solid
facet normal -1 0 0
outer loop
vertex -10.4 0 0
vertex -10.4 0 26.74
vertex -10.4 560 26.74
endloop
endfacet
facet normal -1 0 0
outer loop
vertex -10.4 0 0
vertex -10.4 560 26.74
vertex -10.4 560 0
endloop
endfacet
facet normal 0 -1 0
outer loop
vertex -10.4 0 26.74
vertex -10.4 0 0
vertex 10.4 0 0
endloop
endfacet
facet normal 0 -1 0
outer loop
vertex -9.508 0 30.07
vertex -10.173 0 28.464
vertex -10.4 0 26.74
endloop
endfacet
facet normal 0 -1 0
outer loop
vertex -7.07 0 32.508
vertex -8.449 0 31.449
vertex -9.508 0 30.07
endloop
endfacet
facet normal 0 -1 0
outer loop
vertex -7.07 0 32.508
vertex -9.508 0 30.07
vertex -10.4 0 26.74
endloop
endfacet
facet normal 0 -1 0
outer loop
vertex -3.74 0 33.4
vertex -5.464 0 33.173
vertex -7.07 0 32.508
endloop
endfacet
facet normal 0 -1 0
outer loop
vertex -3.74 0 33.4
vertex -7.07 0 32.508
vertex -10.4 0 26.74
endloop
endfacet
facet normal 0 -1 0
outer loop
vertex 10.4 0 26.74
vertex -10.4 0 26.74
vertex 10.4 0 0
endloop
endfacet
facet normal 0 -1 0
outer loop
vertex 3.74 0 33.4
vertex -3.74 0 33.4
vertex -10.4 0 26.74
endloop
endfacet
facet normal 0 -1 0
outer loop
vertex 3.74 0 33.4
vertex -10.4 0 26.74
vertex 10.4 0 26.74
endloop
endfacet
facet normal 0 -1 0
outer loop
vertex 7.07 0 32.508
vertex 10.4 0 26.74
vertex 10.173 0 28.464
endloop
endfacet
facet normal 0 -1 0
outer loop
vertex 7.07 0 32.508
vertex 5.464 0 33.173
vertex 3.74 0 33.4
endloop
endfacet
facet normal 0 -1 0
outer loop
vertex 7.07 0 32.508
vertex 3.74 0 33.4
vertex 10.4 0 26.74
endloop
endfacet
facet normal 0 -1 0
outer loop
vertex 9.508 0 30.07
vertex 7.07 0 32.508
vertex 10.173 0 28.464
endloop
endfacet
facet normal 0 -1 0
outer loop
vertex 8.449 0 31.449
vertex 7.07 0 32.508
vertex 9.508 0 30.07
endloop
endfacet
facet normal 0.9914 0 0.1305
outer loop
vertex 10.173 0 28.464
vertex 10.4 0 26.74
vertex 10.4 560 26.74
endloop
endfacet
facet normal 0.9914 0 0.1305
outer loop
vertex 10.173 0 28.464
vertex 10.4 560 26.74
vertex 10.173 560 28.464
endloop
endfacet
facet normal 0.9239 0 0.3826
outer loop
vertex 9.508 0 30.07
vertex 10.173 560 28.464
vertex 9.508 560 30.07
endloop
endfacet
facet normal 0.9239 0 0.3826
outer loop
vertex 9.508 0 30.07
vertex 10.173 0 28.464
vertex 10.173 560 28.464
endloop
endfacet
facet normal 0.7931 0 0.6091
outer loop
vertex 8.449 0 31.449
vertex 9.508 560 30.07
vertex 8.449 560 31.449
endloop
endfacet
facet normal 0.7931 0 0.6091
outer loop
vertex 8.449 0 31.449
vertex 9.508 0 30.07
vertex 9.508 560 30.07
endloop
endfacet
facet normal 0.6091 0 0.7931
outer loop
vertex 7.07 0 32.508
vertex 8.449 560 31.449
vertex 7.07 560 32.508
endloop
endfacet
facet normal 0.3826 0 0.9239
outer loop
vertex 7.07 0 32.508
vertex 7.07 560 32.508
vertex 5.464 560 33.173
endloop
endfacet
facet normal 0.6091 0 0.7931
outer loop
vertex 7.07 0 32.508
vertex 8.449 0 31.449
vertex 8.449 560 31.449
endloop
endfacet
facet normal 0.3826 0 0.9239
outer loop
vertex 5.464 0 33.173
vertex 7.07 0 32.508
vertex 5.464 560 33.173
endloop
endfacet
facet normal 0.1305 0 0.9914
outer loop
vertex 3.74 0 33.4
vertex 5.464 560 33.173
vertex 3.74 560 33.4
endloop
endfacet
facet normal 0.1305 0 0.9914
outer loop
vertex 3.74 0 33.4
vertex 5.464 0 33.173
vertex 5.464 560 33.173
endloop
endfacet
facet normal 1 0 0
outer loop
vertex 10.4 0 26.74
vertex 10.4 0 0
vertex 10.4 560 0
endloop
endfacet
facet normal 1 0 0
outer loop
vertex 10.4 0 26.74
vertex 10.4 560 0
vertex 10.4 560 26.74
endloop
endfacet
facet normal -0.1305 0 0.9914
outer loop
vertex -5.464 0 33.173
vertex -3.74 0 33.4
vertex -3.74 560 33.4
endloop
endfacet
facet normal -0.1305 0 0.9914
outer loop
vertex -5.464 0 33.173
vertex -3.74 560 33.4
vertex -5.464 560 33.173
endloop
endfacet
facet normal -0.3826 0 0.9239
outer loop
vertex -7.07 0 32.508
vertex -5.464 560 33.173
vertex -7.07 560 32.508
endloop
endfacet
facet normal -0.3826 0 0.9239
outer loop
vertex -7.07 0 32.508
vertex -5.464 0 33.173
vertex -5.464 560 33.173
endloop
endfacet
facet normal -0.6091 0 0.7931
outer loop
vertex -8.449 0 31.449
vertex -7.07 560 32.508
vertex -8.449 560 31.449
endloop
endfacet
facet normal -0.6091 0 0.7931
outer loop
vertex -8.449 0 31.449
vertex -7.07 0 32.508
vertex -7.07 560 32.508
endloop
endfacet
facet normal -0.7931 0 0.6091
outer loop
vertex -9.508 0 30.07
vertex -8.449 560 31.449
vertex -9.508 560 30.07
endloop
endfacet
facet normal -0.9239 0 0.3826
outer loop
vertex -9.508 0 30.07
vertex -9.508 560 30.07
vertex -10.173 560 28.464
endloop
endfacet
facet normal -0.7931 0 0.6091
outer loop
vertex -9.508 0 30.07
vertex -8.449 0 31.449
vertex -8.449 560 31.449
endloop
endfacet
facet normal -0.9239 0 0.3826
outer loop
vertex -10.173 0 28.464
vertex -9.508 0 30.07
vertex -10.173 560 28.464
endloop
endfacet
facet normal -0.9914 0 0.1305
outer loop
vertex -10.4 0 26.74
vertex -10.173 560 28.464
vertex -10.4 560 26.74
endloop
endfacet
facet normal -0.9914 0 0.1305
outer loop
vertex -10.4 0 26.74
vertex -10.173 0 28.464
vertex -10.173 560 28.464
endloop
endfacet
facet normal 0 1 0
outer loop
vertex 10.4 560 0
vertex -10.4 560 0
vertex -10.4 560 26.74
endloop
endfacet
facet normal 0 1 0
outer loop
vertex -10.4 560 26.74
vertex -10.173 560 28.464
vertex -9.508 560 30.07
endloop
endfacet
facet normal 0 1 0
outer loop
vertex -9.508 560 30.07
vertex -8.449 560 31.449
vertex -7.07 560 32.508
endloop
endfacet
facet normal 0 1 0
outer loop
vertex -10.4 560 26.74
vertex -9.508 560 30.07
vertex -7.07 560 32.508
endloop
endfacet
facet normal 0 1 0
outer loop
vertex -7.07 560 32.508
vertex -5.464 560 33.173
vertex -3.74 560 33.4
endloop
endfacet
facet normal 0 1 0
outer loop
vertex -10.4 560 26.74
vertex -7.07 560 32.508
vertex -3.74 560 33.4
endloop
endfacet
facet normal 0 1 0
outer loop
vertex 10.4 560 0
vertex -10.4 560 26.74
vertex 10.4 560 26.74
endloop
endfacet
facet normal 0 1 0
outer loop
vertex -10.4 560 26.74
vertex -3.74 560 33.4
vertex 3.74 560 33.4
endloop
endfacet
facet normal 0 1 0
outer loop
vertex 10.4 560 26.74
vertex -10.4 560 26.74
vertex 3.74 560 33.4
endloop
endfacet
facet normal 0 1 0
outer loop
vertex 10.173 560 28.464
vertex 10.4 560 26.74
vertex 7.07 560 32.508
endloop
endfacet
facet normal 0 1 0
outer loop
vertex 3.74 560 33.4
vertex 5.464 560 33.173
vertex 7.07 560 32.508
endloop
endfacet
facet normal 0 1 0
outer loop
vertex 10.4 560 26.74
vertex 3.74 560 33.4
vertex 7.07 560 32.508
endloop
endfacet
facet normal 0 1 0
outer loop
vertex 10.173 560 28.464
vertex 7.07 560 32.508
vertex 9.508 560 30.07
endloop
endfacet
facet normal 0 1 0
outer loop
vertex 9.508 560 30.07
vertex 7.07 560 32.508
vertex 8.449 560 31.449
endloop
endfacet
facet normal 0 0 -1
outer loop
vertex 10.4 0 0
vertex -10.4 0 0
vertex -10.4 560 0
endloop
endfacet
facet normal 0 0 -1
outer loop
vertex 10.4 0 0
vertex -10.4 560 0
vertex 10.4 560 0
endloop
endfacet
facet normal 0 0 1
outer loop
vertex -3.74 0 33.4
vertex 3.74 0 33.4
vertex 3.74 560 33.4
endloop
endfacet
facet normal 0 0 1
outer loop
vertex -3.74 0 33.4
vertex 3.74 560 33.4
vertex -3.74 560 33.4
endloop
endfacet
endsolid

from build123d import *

# Parameters (mm, degrees)
PAD_DEPTH = 560


with BuildPart() as part:
    # Sketch → Pad (new body)
    with BuildSketch(Plane.XZ):
        with BuildLine():
            Line((-10.4, 26.74), (-10.4, 0))
            Line((-10.4, 0), (10.4, 0))
            Line((10.4, 0), (10.4, 26.74))
            ThreePointArc((10.4, 26.74), (8.449331, 31.449331), (3.74, 33.4))
            Line((3.74, 33.4), (-3.74, 33.4))
            ThreePointArc((-3.74, 33.4), (-8.449331, 31.449331), (-10.4, 26.74))
        make_face()
    extrude(amount=-PAD_DEPTH)


solid = part.part
